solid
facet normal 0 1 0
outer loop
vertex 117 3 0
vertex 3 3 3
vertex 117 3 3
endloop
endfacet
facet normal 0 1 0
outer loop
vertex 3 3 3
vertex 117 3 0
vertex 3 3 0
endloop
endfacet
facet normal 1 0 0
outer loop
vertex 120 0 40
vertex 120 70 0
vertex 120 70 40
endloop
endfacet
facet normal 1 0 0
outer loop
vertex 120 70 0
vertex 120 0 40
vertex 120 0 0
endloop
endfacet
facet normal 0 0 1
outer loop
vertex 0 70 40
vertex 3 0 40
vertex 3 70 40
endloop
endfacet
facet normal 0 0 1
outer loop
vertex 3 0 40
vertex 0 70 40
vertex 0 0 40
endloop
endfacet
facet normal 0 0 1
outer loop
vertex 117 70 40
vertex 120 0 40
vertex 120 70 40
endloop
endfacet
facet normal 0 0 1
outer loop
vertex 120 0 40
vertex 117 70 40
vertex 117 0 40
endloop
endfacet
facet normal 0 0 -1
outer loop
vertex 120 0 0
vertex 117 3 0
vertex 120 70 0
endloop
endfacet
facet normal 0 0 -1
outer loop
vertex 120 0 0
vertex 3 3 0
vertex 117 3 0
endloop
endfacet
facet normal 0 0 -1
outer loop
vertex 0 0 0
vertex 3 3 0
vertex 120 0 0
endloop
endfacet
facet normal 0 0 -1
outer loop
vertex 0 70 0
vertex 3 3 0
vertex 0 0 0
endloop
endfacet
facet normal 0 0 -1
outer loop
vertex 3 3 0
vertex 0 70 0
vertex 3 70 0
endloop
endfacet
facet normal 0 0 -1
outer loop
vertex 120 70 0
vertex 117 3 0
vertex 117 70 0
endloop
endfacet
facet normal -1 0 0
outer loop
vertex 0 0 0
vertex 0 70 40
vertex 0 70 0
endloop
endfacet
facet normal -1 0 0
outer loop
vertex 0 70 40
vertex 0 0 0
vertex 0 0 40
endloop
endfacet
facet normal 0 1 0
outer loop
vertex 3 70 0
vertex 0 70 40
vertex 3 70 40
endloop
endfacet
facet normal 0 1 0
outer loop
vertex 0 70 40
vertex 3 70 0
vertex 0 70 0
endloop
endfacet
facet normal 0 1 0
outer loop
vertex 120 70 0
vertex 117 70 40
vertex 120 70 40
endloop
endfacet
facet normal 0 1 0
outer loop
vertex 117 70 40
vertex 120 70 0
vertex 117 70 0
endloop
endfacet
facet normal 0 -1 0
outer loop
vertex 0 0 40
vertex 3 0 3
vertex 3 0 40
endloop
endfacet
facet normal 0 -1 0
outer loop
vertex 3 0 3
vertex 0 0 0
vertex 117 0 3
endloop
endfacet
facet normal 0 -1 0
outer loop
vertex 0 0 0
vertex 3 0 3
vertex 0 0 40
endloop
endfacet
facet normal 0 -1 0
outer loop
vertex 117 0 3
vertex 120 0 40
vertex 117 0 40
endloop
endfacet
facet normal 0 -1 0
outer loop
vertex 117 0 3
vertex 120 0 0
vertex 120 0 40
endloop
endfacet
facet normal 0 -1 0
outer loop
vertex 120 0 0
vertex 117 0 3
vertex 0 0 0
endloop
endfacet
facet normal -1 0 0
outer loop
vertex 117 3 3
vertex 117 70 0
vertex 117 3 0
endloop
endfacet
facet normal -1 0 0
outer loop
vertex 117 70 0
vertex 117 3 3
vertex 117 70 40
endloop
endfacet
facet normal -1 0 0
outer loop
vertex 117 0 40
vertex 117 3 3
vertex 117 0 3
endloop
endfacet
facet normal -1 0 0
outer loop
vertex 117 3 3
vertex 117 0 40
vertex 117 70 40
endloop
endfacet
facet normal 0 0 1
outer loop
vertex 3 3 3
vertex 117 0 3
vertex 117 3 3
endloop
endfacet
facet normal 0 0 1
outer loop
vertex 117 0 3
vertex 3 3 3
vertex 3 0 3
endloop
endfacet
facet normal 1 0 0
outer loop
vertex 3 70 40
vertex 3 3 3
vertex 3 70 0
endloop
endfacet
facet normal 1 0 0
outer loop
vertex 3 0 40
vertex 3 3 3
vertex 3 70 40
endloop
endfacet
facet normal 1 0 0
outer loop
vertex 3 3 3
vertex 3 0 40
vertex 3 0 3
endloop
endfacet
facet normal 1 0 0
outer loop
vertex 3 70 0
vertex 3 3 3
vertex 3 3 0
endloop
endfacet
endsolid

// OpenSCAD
// Buffer tank for a mini horizontal gel-electrophoresis box. Open-top rectangular tank with a
// solid raised platform for the gel tray that divides the bottom into two buffer chambers. Each
// end wall gets a horizontal 2 mm hole along X at y = 0, z = 30 for the electrode wires.
//

X  = 120;
Y  = 70;
Z  = 40;
w  = 3;
fl = 3;
pl = 60;
ph = 10;

$fn = 64;

inner_X = X - 2 * w;
inner_Z = Z - fl;

difference() {
    cube([X, Y, Z]);
    translate([w, 0, fl]) cube([inner_X, Y, inner_Z]);     // hollow, open top
    translate([w, w, 0]) cube([inner_X, Y, fl]);           // floor only (no walls up)
    translate([w, w, fl]) cube([pl, Y, ph]);               // gel platform (spans width Y)
    for (x = [-X / 2, X / 2])
        translate([x, w, 0]) rotate([-90, 0, 0])
            cylinder(h = Y + 1, d = 2);                     // electrode holes through end walls
}
